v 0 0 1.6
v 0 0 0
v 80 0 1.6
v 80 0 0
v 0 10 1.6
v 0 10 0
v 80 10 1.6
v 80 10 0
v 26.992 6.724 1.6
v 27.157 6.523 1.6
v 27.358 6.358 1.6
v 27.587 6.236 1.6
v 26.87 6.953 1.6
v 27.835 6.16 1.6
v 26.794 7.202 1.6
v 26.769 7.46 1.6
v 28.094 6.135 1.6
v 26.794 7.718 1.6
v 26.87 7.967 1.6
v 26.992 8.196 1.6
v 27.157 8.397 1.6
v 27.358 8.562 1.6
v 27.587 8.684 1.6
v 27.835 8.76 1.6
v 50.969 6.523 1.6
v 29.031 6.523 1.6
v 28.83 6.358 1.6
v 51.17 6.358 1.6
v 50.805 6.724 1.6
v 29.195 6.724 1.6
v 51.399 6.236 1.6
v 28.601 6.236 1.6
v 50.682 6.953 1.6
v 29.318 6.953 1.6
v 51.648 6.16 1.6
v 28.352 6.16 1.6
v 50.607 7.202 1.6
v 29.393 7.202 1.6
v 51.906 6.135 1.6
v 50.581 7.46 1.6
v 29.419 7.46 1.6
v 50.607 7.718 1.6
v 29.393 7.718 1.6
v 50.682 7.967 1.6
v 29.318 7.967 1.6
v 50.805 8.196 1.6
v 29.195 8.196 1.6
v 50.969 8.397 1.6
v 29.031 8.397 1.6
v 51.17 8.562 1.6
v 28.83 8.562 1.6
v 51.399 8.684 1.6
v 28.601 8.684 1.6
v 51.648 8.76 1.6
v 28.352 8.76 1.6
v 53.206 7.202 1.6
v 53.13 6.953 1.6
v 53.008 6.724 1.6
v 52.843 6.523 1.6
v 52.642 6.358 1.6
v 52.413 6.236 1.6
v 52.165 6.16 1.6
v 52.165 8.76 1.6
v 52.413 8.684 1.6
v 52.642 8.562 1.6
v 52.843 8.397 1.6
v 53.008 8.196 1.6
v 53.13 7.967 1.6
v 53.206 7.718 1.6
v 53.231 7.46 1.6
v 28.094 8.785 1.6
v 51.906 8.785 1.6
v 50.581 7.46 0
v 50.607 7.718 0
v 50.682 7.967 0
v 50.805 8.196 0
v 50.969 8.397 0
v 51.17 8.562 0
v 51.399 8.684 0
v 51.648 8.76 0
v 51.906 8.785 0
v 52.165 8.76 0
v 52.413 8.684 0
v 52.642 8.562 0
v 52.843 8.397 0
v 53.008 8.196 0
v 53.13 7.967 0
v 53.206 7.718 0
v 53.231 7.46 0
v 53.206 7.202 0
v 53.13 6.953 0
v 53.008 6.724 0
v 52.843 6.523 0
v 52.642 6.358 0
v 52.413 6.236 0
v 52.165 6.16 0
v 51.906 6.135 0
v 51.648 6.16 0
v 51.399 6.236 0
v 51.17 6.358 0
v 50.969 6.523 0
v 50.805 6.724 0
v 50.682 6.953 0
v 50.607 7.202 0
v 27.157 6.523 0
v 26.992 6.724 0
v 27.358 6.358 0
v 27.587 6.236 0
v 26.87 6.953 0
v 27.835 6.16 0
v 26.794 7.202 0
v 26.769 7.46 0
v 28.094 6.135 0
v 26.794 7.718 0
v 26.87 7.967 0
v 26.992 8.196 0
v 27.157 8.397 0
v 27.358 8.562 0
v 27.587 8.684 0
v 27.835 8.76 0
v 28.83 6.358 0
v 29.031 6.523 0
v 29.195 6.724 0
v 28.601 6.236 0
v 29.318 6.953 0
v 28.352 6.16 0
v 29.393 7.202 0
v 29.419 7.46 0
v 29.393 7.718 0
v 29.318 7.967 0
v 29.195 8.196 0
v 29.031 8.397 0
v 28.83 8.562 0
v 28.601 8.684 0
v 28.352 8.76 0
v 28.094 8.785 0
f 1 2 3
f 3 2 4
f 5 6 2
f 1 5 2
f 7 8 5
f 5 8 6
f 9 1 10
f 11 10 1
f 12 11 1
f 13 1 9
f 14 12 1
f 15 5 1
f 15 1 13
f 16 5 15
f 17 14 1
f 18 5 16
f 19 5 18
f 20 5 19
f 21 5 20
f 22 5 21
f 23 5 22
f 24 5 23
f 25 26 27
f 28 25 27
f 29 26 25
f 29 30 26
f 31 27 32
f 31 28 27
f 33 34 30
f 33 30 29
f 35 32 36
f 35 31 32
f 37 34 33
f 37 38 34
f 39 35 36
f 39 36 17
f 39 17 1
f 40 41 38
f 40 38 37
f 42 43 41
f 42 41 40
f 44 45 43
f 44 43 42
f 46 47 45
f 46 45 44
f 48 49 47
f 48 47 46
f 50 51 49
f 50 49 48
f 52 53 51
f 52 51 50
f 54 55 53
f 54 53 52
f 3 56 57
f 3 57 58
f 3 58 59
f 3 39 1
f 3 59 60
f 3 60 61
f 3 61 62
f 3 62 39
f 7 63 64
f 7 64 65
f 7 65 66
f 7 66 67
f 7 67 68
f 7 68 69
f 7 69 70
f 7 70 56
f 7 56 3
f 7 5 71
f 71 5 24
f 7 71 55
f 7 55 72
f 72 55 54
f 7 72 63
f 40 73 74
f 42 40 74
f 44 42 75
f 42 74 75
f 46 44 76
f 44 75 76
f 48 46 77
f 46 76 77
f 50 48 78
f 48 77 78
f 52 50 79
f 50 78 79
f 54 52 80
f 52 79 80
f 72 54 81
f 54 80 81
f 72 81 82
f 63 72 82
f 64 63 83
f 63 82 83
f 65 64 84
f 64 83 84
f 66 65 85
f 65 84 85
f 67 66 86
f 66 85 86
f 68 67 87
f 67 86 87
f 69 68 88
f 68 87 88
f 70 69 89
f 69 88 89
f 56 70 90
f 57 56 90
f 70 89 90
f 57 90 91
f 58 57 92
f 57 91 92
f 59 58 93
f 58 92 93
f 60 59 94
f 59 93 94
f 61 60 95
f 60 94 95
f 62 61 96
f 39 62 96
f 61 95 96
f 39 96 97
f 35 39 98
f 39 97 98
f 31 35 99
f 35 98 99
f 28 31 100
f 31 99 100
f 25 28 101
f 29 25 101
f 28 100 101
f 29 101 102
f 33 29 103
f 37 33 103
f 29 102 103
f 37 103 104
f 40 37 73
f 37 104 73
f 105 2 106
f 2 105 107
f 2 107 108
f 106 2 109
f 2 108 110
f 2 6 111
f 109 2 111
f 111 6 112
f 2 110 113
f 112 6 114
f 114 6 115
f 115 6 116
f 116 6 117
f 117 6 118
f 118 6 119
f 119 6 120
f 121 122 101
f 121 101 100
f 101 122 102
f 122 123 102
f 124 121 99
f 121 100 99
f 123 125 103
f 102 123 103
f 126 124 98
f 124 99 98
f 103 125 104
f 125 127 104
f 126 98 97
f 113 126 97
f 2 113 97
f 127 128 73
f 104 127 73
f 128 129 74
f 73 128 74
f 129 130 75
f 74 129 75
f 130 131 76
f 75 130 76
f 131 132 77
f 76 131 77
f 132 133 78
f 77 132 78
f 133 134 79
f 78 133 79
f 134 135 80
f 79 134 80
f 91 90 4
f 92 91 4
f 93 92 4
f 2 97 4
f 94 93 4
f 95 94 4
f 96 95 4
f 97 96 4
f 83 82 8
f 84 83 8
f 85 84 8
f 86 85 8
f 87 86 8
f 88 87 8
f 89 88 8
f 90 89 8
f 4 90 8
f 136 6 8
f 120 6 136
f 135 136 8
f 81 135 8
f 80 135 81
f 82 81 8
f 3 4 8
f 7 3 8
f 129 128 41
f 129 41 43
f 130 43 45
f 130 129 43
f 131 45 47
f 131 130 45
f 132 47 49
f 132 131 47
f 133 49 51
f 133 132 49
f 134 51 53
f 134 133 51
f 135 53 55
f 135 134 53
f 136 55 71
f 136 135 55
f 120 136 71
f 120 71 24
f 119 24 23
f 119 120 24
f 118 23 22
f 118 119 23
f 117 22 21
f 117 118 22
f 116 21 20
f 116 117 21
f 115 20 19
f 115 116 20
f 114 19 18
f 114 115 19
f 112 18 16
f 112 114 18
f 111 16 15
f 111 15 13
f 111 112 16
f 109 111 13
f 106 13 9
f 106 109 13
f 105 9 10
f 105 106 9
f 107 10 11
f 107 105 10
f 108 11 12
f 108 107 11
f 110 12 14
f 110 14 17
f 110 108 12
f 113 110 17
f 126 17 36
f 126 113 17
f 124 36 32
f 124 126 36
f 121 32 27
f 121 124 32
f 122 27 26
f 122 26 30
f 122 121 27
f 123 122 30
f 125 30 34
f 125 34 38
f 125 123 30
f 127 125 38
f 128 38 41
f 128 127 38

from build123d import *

# Parameters (mm, degrees)
F0_R     = 1.325
F1_DEPTH = 1.6


with BuildPart() as f1:
    # F0 (on Top) → F1 (new body)
    with BuildSketch(Plane.XY):
        Polygon((0, 10), (0, 0), (24.125, 0), (55.875, 0), (80, 0), (80, 10), (55.875, 10), (24.125, 10), align=None)
        with Locations((28.09375, 7.46)):
            Circle(F0_R, mode=Mode.SUBTRACT)
        with BuildLine():
            ThreePointArc((53.23125, 7.46), (51.90625, 6.135), (50.58125, 7.46))
            ThreePointArc((50.58125, 7.46), (51.90625, 8.785), (53.23125, 7.46))
        make_face(mode=Mode.SUBTRACT)
    extrude(amount=F1_DEPTH)


solid = f1.part
